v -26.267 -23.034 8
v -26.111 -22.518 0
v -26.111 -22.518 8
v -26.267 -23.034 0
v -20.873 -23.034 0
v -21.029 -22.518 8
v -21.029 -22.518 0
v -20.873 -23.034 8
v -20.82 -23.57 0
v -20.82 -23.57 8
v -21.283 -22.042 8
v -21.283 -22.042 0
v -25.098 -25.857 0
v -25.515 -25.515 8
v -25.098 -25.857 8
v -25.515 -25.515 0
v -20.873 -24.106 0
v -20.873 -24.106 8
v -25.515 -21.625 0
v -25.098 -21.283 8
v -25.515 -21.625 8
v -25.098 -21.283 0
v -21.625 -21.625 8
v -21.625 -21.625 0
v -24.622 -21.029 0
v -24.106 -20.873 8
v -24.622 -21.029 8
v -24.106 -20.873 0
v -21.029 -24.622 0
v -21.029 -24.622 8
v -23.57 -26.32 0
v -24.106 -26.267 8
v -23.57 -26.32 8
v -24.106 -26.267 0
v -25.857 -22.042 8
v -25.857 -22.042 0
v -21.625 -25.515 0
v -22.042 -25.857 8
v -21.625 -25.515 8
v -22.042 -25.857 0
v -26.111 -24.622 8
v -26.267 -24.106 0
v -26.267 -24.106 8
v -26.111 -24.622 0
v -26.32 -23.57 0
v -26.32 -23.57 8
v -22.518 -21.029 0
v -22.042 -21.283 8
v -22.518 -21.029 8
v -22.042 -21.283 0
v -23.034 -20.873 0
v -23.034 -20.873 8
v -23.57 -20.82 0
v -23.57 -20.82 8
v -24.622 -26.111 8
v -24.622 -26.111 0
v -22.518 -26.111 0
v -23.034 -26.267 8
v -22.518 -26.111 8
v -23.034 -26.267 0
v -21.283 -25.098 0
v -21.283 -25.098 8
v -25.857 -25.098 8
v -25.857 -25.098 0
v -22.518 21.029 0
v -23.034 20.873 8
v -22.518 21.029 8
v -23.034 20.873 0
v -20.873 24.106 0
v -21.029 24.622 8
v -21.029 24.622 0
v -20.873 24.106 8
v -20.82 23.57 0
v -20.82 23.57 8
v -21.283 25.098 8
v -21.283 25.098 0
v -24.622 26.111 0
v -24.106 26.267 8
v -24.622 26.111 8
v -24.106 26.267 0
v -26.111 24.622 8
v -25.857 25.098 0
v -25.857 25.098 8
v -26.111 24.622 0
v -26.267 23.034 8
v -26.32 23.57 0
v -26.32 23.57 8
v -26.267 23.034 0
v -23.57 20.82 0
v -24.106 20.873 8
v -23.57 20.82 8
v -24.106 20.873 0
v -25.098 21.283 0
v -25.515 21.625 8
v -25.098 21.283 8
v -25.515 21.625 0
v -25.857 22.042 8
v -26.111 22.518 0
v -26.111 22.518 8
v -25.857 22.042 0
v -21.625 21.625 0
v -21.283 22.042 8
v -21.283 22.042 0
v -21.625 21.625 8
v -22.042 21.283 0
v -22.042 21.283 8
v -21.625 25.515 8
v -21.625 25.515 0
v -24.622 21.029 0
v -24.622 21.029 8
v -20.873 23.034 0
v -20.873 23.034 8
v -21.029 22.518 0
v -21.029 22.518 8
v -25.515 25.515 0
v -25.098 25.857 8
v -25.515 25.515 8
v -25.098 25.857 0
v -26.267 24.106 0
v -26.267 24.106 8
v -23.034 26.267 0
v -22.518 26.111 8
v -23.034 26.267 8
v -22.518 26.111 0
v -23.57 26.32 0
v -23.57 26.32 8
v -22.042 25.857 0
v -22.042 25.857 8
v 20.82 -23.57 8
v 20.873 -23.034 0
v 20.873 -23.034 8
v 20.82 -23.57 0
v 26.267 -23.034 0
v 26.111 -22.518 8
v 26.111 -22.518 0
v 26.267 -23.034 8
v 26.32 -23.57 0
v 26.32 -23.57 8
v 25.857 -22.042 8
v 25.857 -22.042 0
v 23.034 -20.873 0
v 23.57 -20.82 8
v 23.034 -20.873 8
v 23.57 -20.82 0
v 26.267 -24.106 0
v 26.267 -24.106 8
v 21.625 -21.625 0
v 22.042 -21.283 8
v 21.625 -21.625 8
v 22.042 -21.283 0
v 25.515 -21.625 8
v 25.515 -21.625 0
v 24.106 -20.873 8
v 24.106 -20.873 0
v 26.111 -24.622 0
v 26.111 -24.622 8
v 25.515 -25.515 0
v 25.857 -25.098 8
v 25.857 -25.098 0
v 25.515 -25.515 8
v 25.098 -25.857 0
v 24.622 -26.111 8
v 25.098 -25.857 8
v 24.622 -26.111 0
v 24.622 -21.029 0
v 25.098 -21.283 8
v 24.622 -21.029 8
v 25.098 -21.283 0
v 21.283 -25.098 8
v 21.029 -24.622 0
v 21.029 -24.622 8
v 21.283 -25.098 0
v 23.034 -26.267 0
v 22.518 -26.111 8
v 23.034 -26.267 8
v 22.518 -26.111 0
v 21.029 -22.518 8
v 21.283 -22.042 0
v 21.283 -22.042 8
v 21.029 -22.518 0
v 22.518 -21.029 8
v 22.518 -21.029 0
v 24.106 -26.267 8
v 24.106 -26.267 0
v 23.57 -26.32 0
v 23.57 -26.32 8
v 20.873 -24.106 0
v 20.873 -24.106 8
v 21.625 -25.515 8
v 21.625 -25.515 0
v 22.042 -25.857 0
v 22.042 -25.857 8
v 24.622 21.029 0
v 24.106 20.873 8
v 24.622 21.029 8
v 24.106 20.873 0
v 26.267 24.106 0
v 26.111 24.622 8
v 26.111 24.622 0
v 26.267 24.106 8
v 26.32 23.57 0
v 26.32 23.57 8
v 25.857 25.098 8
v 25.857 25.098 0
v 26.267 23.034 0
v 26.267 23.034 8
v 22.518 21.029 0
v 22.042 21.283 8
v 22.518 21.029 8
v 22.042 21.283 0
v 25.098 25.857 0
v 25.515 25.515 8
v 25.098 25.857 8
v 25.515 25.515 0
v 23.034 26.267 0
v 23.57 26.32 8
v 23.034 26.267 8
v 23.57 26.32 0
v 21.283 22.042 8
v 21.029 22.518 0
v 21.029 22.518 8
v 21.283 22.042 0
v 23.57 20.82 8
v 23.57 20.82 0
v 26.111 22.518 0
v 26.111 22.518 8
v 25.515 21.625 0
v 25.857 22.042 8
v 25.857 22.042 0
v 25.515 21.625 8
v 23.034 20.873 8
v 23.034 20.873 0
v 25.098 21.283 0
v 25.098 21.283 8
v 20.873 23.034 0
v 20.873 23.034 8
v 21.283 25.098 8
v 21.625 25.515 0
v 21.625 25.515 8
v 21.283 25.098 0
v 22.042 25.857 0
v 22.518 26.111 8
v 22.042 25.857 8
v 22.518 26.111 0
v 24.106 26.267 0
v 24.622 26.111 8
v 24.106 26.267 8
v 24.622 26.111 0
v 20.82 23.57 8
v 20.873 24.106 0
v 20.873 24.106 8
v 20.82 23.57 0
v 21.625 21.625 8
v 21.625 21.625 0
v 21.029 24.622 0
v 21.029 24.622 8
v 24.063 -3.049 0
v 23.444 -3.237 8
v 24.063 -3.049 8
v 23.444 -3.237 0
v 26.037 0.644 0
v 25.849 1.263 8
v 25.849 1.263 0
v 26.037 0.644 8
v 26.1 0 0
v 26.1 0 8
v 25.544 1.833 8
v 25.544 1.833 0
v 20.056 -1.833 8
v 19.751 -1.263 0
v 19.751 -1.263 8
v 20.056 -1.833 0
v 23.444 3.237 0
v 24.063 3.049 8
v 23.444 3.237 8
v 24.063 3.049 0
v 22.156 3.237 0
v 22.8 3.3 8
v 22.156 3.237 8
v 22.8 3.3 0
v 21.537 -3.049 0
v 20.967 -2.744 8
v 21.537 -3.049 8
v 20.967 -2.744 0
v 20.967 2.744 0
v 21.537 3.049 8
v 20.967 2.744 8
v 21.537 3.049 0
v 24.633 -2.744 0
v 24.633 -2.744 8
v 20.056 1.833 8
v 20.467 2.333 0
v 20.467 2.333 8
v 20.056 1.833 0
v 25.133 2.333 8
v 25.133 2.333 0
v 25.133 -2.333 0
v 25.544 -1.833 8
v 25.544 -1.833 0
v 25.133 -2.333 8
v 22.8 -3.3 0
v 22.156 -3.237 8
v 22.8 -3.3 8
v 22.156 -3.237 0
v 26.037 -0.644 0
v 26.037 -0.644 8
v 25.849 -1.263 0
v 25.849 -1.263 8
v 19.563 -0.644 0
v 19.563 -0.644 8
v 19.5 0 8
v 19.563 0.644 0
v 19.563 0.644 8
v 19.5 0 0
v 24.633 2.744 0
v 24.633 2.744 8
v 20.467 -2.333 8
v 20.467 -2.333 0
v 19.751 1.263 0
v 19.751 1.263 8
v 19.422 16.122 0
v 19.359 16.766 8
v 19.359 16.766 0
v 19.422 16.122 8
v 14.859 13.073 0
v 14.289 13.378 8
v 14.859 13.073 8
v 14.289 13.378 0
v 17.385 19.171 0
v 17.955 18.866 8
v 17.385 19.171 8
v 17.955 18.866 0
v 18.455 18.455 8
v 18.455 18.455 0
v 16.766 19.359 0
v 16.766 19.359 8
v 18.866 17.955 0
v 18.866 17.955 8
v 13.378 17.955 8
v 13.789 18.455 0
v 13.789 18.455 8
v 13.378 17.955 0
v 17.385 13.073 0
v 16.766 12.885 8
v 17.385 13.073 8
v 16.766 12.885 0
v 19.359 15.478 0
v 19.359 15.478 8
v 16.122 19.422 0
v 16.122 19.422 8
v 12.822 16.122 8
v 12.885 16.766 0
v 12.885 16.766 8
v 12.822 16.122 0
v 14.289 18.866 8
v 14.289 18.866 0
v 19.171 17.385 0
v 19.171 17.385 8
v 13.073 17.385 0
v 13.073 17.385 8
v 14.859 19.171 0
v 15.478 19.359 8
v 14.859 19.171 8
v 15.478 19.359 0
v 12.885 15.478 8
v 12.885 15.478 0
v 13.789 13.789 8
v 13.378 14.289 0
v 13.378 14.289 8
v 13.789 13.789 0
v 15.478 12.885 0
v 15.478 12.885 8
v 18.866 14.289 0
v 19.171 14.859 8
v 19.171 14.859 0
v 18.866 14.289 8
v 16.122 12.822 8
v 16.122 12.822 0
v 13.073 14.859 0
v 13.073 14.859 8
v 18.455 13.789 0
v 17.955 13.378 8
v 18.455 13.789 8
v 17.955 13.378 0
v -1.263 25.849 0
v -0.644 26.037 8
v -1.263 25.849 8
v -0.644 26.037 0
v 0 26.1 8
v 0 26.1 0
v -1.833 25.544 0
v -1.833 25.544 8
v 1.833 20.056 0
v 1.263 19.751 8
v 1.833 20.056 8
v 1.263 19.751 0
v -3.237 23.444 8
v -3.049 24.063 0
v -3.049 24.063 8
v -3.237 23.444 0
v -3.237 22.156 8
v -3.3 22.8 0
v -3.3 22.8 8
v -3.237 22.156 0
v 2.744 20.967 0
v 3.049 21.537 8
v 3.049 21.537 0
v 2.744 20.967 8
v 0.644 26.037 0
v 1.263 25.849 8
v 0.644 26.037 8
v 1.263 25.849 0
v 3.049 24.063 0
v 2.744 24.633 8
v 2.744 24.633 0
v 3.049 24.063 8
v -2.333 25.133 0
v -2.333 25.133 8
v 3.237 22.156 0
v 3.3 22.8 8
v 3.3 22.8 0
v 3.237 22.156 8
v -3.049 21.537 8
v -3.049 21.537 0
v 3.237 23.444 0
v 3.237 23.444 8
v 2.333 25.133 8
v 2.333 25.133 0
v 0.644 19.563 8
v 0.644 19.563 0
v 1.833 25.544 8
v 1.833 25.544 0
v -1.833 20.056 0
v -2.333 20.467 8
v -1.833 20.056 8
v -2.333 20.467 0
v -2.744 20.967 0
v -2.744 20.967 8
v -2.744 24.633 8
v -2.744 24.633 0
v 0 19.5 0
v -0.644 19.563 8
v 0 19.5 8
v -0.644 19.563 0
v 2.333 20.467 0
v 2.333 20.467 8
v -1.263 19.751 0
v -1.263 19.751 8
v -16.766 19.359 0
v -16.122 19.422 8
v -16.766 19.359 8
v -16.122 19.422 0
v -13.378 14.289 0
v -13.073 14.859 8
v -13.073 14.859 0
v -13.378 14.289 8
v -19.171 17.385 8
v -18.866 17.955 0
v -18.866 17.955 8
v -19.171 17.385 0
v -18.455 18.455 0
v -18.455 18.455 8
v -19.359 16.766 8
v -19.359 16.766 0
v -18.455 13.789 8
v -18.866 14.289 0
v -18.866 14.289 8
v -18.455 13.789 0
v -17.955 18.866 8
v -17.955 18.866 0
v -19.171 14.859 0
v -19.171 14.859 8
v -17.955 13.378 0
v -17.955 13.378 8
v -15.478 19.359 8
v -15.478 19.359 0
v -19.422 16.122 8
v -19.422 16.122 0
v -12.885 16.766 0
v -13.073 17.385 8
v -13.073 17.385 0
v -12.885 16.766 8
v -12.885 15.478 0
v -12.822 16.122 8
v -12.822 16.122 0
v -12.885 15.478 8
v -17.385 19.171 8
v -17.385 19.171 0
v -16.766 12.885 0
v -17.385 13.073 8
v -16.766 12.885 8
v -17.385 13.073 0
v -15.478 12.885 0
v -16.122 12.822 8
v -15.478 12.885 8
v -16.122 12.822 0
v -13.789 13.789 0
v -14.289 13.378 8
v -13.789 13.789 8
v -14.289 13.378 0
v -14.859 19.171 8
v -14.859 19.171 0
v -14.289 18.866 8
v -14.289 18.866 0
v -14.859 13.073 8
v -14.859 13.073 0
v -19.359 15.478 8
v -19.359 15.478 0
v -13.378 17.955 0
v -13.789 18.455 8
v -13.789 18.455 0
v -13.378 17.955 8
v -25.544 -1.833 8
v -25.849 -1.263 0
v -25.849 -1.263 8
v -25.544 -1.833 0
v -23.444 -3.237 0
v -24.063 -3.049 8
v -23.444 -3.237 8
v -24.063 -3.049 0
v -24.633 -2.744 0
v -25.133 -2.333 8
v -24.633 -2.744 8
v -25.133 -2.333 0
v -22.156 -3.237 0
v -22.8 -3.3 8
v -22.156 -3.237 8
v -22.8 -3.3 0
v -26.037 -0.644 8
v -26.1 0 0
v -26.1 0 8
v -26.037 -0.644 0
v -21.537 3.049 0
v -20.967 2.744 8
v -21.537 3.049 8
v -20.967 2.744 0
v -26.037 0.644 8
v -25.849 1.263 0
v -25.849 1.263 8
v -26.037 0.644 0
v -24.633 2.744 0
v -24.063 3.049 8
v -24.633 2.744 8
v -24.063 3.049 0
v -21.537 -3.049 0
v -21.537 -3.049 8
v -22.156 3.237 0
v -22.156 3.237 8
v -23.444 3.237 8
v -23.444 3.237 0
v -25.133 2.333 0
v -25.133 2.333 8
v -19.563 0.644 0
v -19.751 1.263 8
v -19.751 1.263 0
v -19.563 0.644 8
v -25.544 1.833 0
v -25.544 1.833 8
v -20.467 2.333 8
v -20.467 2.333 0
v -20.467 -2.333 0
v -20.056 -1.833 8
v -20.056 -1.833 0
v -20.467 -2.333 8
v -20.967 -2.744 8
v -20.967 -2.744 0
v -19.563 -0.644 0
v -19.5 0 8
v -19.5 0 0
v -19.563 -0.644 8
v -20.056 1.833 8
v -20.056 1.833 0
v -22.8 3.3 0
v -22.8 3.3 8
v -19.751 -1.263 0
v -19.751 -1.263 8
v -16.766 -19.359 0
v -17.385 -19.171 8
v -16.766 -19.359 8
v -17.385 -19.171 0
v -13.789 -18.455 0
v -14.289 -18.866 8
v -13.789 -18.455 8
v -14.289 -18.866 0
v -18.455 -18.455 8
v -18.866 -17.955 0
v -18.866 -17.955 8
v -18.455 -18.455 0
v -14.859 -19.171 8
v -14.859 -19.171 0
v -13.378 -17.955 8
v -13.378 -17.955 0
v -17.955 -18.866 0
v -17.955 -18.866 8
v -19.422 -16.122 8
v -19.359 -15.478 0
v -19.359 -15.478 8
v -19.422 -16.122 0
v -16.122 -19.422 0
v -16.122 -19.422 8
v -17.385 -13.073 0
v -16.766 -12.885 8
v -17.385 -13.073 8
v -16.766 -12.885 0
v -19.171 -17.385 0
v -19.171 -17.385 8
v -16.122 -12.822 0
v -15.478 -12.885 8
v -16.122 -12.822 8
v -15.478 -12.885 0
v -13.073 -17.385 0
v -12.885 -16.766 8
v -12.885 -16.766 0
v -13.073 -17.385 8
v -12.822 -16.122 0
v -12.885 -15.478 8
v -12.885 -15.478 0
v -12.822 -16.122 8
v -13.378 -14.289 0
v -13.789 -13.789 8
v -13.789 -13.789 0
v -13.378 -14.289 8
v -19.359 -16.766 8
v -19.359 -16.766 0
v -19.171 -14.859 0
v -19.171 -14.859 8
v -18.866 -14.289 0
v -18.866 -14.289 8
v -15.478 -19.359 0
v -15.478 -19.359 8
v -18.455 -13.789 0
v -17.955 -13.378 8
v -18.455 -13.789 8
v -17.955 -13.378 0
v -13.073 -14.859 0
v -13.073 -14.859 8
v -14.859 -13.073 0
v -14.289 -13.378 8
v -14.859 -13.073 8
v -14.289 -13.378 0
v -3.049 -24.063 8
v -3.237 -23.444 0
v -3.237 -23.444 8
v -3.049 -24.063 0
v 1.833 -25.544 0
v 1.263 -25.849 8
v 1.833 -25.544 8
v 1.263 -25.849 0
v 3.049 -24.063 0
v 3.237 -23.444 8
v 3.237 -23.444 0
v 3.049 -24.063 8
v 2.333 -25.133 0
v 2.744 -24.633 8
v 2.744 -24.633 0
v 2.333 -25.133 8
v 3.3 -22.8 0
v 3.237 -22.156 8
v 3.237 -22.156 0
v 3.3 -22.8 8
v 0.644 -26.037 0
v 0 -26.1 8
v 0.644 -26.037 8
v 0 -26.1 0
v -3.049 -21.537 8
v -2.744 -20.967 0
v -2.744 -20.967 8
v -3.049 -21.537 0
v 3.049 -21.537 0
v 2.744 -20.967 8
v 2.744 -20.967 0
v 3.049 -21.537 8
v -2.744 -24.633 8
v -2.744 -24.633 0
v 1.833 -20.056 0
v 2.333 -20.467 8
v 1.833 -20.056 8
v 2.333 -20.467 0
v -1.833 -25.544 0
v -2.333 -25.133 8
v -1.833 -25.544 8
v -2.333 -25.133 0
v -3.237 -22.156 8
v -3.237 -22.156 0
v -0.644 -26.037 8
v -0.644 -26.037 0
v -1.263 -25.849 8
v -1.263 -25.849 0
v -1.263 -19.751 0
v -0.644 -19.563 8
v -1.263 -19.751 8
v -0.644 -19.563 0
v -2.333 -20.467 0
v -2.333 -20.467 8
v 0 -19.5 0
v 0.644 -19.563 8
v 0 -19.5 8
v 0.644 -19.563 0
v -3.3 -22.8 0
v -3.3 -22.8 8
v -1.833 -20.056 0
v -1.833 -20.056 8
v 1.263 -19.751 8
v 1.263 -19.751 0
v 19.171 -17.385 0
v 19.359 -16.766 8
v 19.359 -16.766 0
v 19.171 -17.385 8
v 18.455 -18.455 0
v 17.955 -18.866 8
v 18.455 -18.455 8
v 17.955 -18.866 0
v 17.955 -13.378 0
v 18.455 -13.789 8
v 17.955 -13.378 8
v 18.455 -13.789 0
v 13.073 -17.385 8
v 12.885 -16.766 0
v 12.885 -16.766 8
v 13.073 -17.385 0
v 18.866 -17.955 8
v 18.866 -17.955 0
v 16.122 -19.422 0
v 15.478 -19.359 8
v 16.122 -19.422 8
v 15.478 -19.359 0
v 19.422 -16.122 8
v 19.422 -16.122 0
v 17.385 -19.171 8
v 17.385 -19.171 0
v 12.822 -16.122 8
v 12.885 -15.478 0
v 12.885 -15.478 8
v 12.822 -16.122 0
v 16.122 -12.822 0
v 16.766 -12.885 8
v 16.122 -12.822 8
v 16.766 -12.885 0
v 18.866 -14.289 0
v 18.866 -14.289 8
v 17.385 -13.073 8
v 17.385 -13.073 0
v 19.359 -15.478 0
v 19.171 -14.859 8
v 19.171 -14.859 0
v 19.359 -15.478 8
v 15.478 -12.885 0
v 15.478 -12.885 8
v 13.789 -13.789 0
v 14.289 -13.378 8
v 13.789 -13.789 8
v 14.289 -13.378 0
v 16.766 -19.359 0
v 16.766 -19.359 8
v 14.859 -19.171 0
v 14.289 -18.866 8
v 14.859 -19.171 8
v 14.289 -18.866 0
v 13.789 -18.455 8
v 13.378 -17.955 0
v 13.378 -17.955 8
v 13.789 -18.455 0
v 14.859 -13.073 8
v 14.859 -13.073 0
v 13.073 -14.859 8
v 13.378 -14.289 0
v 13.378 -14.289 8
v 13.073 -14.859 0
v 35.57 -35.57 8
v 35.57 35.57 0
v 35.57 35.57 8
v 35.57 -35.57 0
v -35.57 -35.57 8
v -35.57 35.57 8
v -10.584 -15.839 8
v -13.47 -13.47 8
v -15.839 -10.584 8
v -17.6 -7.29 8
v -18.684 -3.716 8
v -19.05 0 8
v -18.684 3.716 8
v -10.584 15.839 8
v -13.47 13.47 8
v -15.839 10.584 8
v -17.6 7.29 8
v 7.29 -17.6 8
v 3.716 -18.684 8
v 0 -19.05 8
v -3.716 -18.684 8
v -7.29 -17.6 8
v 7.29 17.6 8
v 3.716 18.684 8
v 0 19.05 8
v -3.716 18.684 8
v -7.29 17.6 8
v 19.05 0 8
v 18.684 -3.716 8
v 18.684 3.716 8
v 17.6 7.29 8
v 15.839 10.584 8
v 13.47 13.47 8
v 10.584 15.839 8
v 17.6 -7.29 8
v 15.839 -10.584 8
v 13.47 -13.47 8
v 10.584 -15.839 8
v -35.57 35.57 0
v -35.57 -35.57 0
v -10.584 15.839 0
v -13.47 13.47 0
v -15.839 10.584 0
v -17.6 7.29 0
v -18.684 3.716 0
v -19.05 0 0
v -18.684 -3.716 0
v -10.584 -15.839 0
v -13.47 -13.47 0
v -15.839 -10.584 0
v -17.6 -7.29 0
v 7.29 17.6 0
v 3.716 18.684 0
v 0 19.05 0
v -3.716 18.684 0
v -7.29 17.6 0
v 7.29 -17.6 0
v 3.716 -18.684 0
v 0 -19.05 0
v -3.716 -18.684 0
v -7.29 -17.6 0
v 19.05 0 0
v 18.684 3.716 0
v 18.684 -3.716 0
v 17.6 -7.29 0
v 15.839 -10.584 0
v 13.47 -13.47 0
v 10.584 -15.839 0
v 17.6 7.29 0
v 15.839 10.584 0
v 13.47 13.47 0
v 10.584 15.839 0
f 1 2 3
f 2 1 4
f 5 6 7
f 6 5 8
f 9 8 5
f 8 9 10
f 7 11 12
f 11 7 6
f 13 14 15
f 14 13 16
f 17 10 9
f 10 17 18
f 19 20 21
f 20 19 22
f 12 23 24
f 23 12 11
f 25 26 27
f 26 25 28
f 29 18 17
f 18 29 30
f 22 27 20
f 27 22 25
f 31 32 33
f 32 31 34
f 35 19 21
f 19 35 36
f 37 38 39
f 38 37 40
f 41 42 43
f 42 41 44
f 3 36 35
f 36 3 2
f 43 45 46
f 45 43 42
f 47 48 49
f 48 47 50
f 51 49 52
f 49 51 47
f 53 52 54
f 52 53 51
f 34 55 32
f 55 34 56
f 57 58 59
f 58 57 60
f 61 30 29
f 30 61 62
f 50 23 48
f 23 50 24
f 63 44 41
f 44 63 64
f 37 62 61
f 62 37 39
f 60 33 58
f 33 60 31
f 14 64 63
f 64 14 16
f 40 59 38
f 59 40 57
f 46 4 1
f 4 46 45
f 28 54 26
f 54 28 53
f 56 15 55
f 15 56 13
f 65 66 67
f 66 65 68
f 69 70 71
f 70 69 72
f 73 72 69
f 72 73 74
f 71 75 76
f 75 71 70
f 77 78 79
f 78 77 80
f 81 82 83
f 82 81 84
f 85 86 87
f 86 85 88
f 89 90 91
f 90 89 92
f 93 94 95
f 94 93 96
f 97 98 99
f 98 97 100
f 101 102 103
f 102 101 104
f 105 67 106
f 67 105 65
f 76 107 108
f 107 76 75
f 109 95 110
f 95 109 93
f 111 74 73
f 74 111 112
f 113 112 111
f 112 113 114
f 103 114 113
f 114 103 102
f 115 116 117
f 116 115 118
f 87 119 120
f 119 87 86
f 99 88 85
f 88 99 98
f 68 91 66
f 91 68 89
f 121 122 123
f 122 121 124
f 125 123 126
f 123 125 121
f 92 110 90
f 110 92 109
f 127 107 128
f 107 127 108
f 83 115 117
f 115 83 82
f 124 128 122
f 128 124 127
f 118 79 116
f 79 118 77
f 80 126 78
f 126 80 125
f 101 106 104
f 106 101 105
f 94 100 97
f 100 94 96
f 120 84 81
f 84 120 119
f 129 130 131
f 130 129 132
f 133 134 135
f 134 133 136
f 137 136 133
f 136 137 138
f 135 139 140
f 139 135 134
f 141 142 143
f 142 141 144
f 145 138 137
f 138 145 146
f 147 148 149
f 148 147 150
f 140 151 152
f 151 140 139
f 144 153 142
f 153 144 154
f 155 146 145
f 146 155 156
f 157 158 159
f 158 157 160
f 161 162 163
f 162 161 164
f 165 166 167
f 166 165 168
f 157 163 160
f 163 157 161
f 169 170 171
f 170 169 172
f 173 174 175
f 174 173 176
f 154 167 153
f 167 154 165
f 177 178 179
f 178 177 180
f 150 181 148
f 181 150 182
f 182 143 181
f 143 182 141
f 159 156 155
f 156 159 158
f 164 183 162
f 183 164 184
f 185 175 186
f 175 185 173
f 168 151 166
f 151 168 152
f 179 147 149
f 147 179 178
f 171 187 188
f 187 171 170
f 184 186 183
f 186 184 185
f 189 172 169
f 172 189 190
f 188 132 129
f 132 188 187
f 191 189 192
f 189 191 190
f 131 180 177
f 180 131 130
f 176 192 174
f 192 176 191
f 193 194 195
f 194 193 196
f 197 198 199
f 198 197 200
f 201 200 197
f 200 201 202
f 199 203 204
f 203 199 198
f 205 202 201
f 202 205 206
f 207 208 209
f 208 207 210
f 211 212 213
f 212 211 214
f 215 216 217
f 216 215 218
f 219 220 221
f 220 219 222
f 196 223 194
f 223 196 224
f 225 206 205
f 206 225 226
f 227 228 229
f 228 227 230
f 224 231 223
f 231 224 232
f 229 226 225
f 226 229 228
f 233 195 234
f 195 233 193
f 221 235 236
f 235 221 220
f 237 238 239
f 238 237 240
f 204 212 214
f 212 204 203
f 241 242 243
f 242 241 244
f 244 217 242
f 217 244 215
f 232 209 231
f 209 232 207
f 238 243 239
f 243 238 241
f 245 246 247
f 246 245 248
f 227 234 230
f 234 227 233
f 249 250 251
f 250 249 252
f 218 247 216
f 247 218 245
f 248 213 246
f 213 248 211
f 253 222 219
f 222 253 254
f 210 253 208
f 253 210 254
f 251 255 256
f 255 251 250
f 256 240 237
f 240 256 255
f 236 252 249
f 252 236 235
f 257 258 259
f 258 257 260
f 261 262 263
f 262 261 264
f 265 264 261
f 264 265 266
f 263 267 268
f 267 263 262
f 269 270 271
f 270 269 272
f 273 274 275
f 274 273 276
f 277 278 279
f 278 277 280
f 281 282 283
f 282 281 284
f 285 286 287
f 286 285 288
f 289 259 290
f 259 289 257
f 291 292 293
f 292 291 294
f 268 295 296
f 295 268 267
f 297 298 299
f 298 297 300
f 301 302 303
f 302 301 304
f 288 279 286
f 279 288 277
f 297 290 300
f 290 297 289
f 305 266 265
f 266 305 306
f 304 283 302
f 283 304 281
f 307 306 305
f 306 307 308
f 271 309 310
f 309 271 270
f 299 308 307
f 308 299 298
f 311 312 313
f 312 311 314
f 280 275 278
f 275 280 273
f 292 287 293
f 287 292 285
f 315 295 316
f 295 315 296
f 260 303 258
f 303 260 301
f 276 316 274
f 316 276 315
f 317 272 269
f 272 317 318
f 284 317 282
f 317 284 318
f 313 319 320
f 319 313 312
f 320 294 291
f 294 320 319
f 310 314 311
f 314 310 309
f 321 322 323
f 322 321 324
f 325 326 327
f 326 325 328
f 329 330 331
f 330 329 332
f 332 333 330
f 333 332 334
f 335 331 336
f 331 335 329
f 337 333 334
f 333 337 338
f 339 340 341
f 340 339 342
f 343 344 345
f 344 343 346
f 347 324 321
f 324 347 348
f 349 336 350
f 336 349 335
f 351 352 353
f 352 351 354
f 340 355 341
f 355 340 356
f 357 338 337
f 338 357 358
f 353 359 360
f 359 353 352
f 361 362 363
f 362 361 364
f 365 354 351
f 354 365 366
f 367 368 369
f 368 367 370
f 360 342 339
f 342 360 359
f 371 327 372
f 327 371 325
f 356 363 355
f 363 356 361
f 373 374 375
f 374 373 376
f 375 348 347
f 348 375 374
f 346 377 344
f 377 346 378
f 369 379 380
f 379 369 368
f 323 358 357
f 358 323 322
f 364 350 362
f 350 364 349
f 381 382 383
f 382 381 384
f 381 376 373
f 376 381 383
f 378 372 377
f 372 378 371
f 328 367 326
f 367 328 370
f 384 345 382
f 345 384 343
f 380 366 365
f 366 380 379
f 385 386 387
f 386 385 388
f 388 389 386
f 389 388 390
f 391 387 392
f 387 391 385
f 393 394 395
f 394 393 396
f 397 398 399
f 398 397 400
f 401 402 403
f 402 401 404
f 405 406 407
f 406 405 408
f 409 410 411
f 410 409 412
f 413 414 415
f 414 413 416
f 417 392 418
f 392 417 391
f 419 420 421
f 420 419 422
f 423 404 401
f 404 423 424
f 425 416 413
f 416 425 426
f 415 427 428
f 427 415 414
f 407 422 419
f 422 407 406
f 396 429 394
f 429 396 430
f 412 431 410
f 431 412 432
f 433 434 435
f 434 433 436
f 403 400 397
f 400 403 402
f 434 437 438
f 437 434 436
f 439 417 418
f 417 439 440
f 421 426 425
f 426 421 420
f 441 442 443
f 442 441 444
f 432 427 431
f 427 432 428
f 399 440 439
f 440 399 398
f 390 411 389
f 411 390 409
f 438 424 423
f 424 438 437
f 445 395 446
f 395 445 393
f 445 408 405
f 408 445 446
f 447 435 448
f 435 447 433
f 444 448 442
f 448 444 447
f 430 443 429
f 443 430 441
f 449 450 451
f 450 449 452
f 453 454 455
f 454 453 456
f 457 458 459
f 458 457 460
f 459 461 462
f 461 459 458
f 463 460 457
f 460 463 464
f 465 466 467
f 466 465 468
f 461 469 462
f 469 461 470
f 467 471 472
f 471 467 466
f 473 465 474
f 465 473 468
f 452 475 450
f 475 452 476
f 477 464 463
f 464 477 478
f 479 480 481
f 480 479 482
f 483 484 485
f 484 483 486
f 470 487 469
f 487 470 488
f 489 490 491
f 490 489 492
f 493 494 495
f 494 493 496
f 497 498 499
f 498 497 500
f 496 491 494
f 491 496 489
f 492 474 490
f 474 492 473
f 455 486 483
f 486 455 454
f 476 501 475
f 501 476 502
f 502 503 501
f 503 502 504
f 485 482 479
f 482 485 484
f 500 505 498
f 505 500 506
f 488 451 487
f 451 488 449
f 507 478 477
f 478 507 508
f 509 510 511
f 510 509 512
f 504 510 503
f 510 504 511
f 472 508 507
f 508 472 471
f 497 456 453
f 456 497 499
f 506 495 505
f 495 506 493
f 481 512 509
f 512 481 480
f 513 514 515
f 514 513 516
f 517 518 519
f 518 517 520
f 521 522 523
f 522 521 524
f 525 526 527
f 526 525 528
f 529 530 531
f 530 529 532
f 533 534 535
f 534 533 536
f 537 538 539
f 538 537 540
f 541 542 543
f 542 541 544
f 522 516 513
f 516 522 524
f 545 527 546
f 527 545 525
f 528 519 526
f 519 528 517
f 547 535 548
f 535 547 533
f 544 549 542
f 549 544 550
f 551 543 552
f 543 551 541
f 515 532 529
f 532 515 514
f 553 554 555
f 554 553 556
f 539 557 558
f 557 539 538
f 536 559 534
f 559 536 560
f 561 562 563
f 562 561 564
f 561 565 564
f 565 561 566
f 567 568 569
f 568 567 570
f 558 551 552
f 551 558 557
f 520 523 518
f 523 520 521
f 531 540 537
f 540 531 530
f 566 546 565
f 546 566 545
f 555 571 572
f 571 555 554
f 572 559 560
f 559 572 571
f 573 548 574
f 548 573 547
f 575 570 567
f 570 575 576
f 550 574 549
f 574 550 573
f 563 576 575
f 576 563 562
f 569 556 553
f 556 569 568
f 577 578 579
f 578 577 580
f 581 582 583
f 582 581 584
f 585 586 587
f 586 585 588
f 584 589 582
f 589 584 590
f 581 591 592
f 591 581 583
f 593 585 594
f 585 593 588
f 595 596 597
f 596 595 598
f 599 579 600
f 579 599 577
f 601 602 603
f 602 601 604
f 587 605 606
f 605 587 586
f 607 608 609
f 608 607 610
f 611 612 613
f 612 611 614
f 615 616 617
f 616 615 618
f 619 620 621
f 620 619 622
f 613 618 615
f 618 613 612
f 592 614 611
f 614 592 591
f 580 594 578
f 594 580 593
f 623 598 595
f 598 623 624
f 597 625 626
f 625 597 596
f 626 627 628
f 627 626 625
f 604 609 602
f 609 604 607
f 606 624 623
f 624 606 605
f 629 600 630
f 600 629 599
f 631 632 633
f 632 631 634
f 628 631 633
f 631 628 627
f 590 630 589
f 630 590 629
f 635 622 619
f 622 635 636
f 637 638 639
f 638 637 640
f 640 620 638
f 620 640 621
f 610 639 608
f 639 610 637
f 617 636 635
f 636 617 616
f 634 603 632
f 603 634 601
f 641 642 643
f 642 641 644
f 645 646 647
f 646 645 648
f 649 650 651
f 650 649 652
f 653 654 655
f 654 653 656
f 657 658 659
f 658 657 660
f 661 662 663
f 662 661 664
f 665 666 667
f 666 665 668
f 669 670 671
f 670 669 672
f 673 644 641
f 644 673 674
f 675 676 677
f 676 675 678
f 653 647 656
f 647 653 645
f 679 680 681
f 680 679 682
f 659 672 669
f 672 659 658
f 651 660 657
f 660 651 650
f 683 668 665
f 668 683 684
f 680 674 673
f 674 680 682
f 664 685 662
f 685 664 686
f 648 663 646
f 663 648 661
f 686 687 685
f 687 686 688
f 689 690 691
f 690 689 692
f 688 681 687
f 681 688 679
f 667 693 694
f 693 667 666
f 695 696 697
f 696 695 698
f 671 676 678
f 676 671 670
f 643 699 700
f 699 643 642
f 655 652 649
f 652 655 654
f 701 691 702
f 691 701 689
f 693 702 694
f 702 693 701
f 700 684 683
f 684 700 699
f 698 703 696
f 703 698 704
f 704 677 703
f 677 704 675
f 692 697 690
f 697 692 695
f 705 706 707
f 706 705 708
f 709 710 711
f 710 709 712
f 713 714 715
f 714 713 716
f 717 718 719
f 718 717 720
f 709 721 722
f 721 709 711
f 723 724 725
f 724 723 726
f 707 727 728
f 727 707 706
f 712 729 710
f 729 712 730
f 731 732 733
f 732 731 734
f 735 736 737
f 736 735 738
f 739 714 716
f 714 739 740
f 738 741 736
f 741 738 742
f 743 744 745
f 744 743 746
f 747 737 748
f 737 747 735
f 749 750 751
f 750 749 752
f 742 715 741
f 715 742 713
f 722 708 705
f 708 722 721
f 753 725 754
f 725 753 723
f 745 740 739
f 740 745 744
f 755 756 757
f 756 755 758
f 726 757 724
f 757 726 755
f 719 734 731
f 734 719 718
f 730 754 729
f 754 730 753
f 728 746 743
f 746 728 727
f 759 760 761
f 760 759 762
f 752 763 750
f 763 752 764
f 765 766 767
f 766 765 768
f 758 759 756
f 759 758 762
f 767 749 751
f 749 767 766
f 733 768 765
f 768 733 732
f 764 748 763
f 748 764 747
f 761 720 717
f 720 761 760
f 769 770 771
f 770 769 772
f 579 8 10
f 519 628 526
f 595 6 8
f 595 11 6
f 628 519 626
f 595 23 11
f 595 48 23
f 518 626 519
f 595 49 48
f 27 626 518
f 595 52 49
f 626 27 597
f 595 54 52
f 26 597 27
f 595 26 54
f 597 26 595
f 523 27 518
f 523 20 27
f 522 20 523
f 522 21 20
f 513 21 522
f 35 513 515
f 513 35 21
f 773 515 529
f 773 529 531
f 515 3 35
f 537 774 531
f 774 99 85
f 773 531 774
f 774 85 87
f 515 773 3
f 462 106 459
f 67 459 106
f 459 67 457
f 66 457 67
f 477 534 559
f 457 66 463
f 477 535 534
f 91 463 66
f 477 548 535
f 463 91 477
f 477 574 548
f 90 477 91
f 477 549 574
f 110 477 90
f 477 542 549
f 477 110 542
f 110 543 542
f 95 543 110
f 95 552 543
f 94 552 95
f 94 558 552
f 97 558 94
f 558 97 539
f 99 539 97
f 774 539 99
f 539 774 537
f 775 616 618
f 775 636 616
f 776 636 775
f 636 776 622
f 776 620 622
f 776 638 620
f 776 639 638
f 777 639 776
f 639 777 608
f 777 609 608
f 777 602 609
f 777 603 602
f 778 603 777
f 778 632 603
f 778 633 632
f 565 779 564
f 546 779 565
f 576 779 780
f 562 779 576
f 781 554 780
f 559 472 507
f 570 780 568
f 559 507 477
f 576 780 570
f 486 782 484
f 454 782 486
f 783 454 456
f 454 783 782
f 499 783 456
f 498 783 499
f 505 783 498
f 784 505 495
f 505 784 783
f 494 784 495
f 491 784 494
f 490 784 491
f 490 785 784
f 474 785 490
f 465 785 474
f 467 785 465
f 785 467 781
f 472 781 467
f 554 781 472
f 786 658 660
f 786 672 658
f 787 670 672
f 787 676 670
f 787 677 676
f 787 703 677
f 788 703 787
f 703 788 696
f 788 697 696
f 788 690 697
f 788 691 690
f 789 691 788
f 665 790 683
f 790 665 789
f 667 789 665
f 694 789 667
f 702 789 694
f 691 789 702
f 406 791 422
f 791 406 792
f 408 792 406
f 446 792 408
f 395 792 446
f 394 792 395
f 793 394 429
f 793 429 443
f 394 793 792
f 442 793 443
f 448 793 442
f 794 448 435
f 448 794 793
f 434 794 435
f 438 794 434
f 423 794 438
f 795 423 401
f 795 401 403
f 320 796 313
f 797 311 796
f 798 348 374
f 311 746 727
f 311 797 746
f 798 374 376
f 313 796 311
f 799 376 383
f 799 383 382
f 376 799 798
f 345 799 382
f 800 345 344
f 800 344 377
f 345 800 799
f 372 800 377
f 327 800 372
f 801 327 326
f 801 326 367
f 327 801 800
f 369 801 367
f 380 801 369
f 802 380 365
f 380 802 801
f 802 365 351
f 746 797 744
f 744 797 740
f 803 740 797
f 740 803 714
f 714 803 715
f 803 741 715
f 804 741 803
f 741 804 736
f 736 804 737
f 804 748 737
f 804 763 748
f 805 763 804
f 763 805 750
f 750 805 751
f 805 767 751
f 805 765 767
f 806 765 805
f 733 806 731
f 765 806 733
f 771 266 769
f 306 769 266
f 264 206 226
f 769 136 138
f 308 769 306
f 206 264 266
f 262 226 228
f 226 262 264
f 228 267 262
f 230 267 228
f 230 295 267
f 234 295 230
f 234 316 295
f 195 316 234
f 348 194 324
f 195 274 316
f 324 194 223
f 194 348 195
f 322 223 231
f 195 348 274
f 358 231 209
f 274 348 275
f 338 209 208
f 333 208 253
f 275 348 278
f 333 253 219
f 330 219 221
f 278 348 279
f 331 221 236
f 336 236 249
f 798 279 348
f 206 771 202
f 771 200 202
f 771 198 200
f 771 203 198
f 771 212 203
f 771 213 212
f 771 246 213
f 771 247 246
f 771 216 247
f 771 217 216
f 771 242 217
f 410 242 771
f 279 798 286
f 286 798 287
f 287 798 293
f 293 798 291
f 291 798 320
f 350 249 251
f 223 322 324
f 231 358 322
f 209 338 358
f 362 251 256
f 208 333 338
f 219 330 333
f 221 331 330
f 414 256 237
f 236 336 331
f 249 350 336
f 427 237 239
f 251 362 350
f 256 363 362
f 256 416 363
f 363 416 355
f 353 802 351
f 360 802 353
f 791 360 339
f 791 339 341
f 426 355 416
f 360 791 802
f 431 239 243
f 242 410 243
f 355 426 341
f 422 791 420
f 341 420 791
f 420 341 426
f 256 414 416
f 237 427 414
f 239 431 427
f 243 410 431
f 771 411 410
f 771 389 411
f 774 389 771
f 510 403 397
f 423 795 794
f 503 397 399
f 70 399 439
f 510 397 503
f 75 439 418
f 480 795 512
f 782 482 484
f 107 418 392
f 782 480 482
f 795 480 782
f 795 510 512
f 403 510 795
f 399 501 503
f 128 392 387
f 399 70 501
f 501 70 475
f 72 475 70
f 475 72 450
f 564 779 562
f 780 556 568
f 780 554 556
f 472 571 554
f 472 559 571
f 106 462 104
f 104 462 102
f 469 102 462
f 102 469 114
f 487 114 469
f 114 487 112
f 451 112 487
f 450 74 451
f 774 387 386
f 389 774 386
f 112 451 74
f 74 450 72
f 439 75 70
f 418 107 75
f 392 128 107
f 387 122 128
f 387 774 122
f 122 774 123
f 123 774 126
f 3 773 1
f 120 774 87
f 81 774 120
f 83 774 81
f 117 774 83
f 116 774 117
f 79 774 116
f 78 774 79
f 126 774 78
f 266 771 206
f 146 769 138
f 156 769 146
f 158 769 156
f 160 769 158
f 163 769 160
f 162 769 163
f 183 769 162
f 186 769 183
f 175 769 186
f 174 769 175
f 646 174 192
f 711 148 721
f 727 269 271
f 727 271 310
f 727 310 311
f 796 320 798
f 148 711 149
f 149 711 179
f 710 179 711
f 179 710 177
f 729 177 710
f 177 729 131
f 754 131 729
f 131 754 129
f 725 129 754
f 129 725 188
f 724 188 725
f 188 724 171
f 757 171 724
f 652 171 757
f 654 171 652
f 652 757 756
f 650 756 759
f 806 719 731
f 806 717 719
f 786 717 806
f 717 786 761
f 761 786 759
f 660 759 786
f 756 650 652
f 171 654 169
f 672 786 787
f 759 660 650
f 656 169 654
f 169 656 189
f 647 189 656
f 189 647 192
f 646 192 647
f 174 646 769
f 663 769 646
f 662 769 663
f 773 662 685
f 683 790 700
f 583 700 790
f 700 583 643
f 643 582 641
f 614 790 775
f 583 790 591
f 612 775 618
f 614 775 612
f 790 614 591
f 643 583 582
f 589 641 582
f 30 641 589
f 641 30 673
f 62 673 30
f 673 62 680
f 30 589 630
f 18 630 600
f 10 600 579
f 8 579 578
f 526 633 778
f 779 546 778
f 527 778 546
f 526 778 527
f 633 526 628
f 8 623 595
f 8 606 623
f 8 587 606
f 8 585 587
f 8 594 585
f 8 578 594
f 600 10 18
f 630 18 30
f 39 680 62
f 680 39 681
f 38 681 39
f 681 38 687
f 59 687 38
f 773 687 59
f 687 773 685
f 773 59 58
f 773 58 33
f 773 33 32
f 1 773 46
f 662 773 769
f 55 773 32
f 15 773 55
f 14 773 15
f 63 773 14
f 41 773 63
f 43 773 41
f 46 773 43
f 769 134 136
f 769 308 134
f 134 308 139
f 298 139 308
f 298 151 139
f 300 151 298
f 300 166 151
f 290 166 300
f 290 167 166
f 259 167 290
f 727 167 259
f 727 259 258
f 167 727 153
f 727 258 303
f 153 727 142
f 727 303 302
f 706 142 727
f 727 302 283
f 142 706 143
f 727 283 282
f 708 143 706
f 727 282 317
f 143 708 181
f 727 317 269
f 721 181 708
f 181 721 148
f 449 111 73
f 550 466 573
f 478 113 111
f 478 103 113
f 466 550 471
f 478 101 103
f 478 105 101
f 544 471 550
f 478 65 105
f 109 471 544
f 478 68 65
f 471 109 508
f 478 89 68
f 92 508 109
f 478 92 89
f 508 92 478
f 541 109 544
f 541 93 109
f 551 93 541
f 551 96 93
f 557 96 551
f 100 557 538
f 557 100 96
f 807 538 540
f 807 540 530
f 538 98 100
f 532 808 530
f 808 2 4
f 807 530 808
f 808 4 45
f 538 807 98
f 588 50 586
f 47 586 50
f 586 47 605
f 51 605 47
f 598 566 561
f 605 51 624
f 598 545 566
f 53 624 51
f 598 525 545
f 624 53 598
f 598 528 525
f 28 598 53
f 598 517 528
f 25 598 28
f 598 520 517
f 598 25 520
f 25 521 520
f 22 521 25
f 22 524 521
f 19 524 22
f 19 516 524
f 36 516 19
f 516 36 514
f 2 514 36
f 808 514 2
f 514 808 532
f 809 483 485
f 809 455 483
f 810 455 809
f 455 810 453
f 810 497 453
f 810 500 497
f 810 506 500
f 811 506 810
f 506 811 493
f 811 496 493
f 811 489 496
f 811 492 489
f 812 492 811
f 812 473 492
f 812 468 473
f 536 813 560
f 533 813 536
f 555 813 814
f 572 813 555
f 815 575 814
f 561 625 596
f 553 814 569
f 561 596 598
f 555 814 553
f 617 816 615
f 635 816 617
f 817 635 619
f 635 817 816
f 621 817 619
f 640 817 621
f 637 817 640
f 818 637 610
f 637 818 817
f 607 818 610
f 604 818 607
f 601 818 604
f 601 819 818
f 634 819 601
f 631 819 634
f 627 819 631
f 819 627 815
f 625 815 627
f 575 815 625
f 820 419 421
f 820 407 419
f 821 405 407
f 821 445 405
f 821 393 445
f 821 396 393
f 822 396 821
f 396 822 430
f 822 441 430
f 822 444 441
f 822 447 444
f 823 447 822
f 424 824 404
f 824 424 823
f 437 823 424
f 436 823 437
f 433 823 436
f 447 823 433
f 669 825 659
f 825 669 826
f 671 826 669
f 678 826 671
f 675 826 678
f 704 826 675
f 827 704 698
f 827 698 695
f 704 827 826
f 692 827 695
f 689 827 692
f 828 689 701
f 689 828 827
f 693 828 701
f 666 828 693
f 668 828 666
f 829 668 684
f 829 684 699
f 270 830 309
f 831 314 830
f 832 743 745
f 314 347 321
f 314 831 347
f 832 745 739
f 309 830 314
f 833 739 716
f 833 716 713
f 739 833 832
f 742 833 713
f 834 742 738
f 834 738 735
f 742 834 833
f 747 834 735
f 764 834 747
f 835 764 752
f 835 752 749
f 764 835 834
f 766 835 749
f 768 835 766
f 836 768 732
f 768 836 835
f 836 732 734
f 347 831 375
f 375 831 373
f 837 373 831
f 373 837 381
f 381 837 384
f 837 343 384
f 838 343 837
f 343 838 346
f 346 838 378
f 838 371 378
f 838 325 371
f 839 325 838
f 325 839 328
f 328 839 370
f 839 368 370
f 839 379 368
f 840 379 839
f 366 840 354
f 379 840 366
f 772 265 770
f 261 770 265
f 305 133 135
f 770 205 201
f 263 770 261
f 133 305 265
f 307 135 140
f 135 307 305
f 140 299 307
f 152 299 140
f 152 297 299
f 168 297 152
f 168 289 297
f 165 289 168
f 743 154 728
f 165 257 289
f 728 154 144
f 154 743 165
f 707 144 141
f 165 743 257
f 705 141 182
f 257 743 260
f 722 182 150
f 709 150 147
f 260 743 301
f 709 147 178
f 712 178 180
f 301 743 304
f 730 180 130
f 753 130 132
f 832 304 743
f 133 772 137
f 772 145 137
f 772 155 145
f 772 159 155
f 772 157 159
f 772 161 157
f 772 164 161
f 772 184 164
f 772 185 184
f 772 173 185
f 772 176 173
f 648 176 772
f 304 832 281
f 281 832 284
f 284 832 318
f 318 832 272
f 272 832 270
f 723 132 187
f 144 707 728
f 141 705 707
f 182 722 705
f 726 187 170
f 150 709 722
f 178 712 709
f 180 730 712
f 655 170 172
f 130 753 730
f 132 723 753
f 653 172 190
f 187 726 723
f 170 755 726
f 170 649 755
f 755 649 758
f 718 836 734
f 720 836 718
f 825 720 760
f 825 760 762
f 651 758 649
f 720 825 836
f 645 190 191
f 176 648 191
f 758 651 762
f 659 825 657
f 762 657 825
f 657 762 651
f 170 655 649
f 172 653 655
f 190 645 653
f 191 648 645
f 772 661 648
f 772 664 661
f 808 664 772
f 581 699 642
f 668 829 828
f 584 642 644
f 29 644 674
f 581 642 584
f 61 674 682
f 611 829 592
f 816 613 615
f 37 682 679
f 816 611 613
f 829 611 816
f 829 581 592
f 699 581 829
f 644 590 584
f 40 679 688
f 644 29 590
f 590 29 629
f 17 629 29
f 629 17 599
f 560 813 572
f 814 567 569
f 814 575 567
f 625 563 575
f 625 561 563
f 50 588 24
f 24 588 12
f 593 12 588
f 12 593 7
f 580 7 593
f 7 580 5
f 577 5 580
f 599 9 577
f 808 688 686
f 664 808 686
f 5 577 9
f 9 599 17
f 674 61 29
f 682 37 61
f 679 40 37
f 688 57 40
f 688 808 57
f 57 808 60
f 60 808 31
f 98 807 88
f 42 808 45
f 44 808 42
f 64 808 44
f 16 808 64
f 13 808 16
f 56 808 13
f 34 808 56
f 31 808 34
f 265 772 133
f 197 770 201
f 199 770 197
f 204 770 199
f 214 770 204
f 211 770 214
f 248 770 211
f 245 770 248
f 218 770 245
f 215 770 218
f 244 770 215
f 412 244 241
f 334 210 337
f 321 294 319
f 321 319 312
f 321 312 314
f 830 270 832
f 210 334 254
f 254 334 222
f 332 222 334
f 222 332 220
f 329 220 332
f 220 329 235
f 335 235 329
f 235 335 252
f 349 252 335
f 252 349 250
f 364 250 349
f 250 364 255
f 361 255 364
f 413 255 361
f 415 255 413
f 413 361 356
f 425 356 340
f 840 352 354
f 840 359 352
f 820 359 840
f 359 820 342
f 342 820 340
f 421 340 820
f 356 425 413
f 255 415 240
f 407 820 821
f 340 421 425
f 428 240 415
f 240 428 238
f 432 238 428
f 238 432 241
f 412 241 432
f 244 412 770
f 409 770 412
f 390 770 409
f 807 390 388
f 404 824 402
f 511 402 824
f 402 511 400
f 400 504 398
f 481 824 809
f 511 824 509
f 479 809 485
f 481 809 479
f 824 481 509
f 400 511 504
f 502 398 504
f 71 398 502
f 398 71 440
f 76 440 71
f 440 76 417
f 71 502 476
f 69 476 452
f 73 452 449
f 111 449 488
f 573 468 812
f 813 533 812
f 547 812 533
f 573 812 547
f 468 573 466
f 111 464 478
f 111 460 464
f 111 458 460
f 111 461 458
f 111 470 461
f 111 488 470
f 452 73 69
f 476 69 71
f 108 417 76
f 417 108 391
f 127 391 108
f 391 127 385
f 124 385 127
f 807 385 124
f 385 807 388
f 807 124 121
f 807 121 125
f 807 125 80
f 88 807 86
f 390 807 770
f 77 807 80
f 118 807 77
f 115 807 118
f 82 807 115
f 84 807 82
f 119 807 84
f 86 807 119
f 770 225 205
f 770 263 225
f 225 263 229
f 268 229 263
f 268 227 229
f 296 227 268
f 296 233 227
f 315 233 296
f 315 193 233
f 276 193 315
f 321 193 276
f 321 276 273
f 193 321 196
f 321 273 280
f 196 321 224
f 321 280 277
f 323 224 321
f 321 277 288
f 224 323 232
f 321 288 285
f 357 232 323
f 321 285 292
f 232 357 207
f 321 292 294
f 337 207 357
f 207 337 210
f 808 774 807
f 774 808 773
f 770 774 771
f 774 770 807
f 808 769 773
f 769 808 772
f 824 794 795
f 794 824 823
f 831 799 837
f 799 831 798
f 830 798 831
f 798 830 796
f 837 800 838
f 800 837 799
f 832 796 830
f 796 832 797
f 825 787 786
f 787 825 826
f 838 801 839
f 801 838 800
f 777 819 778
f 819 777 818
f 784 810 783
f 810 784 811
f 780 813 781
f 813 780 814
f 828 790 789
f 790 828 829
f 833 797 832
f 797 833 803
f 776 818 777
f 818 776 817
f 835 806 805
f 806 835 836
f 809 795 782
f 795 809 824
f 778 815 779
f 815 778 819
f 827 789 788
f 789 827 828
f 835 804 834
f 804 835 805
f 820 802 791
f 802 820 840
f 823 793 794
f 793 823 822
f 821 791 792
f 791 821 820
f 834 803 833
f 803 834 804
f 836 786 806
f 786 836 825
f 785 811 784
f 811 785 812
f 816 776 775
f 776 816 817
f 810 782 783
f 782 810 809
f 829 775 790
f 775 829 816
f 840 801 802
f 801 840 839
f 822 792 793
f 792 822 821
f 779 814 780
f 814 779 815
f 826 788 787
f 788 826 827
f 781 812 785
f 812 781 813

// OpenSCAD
$fn = 32;

// ----------------------------------------------------------------------
// Motor mount plate: NEMA23, 71.14 x 71.14 x 8 mm
// ----------------------------------------------------------------------

// --- parameters (mm) ---
base_x = 71.14;           // plate length, X
base_y = 71.14;           // plate width, Y
thick = 8;                // plate thickness
bolt_pitch = 47.14;       // NEMA23 bolt spacing
motor_d = 5.5;            // NEMA23 screw clearance
boss_hole = 38.1;         // pilot boss bore
second_d = 6.6;           // second fastener hole
bc_r = 22.8;              // second bolt circle radius
bc_n = 8;                 // second bolt circle count

module plate() {
  translate([-base_x / 2, -base_y / 2, 0]) cube([base_x, base_y, thick]);
}

module motor_holes() {
  for (sx = [-1, 1]) for (sy = [-1, 1])
    translate([sx * bolt_pitch / 2, sy * bolt_pitch / 2, -1])
      cylinder(h = thick + 2, d = motor_d);
}

difference() {
  union() {
    plate();
  }
  motor_holes();
  translate([0, 0, -1]) cylinder(h = thick + 2, d = boss_hole);
  for (i = [0 : bc_n - 1]) rotate([0, 0, i * 360 / bc_n]) translate([bc_r, 0, -1])    cylinder(h = thick + 2, d = second_d);
}
